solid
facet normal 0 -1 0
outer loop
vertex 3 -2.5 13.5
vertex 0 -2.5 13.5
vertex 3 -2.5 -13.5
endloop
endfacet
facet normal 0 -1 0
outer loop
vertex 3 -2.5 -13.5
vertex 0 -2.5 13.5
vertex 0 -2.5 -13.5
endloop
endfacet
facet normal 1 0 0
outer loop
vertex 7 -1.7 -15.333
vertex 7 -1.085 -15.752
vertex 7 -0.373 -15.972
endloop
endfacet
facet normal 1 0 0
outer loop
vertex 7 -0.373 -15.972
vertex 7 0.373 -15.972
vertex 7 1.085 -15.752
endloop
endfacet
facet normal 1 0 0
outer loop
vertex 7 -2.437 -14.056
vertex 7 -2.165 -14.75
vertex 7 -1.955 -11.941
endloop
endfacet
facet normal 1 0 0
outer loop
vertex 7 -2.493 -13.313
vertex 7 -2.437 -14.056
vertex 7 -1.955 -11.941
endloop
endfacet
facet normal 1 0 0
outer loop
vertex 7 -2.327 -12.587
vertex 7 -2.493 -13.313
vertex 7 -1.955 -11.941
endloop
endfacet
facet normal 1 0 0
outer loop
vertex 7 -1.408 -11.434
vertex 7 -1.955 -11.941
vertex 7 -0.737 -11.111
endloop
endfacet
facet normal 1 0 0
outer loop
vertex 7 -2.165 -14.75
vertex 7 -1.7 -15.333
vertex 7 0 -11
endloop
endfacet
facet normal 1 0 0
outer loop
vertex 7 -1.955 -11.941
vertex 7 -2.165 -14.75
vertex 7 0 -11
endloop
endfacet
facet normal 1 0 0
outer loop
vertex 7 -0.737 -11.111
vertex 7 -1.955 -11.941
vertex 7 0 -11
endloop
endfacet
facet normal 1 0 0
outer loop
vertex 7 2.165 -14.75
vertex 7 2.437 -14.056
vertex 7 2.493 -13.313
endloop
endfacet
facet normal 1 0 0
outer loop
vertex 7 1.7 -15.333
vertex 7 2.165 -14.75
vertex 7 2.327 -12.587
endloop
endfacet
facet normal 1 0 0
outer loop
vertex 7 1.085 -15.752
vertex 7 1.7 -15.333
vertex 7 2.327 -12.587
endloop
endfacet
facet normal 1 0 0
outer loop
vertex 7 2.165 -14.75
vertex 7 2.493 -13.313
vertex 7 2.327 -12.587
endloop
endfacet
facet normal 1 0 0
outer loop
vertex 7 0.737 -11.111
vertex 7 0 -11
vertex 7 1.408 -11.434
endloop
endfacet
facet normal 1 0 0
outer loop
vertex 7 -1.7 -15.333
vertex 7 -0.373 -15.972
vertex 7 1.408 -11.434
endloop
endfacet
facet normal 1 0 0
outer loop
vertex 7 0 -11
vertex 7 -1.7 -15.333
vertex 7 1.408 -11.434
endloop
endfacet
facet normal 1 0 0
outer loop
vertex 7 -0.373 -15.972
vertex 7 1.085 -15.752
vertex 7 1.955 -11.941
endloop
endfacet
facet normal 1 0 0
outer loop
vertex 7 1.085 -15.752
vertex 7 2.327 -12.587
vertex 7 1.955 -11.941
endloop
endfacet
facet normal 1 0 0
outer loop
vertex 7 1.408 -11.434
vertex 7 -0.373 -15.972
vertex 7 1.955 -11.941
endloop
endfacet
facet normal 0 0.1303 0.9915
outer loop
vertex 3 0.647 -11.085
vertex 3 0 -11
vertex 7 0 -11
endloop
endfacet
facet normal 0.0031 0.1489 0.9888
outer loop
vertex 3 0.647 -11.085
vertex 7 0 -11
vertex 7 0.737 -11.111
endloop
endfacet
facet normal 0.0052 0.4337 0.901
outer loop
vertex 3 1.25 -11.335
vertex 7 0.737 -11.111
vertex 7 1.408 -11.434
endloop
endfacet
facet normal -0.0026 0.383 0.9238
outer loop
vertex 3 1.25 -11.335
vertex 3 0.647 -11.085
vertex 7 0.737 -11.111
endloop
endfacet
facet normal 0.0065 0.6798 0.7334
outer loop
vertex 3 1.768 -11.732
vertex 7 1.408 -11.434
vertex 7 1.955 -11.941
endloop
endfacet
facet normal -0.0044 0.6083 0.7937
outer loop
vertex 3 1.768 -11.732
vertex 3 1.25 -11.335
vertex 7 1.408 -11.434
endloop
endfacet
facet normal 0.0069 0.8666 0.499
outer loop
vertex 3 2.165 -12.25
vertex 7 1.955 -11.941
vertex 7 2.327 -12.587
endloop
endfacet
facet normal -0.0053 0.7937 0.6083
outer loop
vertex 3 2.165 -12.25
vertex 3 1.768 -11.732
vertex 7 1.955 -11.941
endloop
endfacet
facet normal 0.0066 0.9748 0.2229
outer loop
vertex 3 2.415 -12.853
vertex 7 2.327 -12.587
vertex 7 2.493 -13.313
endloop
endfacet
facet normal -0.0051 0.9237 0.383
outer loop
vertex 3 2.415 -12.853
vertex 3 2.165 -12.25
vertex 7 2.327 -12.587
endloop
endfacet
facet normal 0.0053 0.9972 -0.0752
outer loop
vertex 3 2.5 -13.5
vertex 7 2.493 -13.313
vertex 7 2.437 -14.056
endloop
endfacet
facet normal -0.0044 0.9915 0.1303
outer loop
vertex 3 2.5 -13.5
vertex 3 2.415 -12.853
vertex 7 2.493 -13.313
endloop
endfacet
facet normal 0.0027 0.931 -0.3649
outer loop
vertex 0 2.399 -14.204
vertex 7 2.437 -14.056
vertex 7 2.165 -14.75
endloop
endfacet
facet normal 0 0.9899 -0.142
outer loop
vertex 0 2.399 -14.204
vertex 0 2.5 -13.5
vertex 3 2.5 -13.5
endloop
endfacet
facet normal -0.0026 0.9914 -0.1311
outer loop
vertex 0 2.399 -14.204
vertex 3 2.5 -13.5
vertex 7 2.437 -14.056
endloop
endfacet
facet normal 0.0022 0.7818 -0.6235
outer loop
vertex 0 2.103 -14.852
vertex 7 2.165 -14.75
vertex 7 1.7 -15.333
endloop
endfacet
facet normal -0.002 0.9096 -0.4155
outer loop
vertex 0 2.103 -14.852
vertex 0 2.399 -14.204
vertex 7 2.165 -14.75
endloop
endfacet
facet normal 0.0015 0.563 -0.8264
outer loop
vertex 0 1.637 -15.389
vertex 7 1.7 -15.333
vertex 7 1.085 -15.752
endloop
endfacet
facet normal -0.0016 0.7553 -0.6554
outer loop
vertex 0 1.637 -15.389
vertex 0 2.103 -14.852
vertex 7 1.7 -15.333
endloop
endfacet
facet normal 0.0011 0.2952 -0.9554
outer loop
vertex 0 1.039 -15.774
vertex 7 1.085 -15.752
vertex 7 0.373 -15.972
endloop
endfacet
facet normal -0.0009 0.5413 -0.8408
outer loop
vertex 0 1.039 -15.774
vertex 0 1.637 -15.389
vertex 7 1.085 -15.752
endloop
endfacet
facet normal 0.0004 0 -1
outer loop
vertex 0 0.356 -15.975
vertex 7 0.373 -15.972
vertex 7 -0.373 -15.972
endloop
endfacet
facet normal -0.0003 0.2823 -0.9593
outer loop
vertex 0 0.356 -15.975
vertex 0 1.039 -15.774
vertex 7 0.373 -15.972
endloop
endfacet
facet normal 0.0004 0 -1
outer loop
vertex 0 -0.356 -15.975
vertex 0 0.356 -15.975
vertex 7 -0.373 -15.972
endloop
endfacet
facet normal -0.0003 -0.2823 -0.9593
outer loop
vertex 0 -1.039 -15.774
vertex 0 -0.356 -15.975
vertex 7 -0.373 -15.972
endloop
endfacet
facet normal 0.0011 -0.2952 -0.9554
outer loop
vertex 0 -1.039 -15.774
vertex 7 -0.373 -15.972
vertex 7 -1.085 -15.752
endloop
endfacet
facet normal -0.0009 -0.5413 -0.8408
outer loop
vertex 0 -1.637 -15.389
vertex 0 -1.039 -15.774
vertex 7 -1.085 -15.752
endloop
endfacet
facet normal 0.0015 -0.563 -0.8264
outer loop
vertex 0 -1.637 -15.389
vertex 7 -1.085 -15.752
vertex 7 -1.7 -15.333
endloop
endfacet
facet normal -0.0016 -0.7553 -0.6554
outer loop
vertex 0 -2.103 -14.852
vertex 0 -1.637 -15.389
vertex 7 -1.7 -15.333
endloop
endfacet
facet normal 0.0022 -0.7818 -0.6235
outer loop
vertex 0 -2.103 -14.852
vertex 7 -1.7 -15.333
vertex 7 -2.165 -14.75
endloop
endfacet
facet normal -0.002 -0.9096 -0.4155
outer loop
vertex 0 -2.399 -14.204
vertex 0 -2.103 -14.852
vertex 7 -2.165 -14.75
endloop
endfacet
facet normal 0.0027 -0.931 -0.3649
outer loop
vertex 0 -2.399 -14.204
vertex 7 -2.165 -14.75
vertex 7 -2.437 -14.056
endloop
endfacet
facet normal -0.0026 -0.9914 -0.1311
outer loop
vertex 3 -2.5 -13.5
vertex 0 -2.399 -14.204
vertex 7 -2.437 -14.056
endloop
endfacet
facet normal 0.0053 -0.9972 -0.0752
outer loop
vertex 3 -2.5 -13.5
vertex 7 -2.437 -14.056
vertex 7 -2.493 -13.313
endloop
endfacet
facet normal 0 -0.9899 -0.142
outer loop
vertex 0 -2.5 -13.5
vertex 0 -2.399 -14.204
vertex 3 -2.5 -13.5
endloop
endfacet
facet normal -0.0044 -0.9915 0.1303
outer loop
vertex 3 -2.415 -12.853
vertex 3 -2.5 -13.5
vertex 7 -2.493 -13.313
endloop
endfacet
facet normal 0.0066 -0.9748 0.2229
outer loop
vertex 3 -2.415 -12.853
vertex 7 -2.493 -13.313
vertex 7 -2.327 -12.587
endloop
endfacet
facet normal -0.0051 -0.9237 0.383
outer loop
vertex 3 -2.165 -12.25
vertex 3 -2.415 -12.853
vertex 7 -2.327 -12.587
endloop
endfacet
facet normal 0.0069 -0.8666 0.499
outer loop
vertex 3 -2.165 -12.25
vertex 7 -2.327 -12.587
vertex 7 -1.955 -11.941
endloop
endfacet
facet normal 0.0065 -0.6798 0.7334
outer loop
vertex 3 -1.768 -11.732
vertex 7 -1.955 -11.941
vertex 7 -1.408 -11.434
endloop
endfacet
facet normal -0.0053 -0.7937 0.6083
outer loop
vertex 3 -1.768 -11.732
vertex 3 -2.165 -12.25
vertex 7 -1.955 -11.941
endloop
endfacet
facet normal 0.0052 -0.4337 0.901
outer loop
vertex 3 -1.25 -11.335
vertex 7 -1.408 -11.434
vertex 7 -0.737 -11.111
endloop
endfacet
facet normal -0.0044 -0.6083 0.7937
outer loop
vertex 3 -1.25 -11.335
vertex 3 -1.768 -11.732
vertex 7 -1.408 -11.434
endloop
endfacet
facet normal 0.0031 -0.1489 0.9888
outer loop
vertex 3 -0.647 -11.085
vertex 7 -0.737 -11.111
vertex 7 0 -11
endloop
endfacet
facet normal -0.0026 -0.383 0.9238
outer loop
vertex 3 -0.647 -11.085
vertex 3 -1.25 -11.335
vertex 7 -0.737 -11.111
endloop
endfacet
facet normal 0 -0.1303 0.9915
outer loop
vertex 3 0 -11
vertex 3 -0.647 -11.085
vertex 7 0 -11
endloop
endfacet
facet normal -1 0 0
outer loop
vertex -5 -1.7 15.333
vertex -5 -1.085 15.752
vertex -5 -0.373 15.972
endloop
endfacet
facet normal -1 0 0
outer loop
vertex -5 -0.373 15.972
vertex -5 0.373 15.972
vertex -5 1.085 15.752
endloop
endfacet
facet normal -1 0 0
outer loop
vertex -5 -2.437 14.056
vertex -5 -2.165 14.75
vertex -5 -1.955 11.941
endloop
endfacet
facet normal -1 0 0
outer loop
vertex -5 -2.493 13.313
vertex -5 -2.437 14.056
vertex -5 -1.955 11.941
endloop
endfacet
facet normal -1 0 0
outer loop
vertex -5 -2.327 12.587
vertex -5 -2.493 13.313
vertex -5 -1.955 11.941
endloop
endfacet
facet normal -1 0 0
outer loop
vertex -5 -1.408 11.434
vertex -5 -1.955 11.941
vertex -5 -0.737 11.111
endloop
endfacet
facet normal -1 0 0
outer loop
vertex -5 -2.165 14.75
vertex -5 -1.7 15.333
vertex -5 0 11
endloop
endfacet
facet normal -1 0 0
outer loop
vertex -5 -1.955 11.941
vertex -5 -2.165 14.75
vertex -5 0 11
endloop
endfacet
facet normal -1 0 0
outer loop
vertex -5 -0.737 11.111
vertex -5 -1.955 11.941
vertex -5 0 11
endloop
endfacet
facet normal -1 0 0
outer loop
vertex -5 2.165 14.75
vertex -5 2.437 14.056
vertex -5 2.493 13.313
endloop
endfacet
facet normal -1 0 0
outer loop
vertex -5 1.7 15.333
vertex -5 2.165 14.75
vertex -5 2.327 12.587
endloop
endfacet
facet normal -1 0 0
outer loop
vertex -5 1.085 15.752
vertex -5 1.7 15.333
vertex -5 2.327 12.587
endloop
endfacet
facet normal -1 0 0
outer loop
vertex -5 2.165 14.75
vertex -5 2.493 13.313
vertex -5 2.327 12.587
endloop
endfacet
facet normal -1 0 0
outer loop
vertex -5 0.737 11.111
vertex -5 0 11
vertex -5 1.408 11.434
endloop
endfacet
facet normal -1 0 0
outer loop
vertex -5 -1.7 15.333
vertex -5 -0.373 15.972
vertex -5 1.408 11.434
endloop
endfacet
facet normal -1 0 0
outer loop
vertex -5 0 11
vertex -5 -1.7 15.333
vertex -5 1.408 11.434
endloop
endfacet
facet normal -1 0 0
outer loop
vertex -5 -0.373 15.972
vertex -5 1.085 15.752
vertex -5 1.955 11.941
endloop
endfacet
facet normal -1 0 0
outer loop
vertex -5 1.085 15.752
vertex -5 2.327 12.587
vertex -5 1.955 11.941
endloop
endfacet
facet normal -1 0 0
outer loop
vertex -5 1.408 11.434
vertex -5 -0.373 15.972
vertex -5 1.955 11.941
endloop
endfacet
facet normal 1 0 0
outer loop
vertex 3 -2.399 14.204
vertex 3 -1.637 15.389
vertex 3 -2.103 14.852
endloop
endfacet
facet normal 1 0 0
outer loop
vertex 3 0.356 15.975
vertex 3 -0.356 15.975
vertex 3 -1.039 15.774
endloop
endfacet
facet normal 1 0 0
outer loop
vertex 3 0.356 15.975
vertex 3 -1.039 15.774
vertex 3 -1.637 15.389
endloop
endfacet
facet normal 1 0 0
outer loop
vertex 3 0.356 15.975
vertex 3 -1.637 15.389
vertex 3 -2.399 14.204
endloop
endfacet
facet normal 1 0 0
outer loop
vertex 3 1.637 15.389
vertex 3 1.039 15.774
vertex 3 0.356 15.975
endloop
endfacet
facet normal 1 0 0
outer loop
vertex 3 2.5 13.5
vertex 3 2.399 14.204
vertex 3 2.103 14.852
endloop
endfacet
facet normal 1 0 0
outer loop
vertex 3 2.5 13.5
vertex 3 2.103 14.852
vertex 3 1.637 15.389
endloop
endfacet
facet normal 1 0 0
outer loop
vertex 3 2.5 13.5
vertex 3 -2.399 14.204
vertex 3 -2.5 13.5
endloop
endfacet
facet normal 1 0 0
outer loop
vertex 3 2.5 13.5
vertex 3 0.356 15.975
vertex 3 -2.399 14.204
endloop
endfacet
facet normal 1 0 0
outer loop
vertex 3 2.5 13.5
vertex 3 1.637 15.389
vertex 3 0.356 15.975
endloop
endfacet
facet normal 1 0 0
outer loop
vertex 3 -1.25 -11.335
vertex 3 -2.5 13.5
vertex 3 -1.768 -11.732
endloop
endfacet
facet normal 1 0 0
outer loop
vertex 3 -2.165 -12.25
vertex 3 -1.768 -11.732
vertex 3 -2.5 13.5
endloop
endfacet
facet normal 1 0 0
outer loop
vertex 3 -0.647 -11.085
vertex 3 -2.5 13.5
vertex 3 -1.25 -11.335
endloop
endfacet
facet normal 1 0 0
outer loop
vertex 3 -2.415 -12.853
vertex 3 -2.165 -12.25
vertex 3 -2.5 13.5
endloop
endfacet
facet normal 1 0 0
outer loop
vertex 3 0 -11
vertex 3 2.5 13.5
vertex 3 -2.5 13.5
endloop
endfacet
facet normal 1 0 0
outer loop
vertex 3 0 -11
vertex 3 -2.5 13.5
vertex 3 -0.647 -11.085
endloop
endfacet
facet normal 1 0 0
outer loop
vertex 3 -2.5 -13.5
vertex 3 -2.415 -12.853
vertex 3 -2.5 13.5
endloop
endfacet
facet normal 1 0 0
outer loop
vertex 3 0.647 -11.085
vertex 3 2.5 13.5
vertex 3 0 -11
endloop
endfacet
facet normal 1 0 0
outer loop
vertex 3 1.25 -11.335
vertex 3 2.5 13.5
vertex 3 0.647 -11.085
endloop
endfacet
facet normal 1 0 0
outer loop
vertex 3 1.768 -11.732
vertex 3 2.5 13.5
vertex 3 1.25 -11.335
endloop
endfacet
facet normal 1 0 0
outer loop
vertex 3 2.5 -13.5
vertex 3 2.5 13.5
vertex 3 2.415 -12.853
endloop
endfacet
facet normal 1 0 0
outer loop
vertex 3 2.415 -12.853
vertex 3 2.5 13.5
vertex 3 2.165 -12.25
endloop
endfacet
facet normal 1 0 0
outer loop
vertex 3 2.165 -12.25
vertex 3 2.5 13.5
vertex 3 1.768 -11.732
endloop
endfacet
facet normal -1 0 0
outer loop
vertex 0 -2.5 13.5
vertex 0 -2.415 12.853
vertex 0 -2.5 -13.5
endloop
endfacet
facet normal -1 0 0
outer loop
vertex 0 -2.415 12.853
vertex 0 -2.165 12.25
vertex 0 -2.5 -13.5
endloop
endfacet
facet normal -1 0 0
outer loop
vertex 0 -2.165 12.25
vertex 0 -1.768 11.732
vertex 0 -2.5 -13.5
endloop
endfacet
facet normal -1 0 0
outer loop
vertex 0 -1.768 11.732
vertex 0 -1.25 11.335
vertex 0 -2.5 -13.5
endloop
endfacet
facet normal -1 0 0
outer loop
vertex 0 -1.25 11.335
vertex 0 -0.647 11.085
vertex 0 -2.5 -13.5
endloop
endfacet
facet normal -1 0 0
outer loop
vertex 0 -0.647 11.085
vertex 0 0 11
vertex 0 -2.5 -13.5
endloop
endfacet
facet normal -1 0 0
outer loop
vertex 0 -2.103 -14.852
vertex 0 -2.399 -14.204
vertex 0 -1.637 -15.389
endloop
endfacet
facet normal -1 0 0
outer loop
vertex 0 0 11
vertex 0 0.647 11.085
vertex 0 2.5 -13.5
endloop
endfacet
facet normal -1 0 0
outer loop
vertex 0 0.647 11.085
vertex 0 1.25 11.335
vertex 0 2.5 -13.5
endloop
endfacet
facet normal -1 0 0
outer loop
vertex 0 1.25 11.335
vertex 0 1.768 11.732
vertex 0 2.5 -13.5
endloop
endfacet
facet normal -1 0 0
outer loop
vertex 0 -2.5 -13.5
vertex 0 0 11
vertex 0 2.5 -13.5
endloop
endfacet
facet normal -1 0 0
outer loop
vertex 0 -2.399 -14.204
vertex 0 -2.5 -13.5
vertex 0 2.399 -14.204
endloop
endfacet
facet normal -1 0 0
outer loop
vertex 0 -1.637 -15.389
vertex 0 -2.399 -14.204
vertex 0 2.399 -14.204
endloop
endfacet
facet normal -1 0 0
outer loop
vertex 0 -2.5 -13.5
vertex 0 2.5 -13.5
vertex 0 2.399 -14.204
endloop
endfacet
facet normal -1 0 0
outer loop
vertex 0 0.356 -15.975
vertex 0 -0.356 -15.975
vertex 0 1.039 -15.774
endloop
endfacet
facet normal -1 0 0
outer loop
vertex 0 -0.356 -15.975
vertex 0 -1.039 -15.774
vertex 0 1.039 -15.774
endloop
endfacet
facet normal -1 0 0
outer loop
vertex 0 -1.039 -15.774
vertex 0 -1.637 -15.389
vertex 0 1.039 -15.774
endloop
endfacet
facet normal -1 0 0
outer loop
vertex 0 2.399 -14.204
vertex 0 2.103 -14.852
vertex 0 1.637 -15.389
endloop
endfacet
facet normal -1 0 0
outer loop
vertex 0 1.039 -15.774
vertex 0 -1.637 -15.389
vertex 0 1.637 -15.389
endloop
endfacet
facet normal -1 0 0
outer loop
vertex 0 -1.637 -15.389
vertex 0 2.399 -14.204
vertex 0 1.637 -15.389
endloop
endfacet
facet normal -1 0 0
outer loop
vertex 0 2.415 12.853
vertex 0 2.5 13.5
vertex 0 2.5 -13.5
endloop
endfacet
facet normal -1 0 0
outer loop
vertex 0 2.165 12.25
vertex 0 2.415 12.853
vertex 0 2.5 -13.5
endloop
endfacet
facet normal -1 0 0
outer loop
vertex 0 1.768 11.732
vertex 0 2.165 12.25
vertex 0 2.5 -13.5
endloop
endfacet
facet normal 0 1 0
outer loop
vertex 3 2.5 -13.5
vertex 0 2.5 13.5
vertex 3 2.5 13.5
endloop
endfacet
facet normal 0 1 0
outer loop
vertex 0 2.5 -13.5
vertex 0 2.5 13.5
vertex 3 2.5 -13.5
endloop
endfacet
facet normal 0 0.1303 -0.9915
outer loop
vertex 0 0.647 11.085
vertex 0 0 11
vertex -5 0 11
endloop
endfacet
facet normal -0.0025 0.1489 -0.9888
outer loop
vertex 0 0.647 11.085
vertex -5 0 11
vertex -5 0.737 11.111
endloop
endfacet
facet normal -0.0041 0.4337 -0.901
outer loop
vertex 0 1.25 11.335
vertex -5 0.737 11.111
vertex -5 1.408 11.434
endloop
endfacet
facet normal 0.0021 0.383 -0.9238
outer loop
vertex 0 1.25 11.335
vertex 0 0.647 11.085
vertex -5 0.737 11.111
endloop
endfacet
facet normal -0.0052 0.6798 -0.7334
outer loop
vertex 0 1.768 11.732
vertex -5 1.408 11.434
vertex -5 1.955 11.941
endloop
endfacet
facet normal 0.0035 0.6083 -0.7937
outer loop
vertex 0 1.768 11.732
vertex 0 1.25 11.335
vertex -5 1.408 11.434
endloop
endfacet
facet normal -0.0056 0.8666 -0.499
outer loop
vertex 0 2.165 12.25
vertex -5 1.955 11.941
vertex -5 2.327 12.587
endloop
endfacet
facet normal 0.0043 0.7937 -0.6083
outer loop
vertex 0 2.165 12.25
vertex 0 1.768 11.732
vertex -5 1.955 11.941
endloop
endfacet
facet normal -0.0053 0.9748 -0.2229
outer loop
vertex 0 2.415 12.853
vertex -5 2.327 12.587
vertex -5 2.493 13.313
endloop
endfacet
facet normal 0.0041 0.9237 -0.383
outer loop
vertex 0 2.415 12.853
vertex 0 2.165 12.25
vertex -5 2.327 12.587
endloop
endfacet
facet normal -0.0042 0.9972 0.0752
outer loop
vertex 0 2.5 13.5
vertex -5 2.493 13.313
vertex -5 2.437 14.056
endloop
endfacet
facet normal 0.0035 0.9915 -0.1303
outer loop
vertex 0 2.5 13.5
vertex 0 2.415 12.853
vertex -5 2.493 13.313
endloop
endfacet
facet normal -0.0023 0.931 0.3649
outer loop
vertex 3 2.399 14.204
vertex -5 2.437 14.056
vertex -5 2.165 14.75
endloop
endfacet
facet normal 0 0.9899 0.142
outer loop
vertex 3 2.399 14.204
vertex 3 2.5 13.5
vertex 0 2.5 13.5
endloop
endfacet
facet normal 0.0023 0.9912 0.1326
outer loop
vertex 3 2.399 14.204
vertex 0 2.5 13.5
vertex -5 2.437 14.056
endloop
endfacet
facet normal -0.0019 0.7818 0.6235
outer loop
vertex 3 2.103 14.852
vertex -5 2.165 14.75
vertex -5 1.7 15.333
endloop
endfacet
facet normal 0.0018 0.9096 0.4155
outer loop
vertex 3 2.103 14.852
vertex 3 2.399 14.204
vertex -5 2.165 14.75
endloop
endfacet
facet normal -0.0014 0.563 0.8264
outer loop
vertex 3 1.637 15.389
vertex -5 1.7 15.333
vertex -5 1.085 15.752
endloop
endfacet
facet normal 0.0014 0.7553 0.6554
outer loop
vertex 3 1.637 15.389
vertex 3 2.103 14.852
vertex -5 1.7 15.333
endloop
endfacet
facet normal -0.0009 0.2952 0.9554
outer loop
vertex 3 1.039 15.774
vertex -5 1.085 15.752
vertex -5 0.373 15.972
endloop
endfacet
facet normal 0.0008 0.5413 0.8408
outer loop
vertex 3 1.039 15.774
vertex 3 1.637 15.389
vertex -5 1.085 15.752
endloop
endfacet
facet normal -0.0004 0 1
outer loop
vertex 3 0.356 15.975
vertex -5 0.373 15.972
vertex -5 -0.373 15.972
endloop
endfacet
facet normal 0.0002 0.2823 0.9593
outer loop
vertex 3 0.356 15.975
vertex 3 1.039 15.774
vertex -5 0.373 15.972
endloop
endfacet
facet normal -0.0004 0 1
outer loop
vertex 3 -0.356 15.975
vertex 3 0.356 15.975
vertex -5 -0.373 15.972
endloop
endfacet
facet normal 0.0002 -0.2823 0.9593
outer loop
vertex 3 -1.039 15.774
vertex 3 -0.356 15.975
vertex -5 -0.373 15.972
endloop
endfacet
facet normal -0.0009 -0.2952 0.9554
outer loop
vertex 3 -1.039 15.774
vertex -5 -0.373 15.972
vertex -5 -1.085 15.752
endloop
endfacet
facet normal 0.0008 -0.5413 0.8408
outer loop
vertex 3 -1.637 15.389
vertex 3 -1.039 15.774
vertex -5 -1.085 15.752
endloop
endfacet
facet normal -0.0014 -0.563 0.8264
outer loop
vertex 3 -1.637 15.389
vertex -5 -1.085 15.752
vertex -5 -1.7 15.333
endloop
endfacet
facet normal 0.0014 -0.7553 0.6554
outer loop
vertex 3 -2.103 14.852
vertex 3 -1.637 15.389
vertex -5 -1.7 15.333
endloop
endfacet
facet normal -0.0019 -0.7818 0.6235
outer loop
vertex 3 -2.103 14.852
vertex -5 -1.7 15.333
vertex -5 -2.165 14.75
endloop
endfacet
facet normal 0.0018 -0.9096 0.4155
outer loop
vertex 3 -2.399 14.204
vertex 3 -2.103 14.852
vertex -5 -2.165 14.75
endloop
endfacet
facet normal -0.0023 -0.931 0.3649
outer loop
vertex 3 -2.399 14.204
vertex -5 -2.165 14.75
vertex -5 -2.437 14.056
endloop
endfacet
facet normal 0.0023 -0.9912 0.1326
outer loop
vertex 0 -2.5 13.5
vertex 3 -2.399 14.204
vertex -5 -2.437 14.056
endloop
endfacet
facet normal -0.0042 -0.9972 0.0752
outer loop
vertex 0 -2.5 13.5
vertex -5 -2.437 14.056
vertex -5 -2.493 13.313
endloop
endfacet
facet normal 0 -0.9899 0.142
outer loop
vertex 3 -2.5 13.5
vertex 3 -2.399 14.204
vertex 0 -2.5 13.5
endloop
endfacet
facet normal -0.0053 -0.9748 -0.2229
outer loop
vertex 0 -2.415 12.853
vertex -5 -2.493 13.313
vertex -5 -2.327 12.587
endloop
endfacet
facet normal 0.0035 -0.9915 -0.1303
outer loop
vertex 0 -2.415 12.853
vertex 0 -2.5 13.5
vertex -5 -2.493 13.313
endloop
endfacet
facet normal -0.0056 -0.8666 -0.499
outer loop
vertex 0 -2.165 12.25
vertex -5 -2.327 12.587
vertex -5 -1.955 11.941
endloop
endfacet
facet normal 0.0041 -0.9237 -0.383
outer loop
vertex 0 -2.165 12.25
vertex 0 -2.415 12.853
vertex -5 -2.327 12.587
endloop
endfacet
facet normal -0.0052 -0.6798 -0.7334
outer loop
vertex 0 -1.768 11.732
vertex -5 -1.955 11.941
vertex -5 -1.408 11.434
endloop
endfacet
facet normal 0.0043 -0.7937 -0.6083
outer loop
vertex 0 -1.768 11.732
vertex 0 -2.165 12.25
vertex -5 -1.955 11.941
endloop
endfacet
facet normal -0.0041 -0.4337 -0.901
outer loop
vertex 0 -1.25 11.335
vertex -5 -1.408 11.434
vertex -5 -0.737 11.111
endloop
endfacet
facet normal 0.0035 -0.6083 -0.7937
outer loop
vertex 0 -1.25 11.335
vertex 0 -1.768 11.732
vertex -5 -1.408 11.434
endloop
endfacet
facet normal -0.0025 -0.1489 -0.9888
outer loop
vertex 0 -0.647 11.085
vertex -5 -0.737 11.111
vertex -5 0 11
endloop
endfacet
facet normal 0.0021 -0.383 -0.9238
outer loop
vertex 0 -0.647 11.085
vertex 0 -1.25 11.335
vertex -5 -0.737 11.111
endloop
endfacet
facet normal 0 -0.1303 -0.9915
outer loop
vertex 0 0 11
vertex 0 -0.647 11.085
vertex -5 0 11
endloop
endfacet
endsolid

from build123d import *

# Parameters (mm, degrees)
SKETCH1_W           = 27
SKETCH1_H           = 5
BOSS_EXTRUDE1_DEPTH = 3
SKETCH2_R           = 2.5
BOSS_EXTRUDE2_DEPTH = 8
SKETCH3_R           = 2.5
BOSS_EXTRUDE3_DEPTH = 7


with BuildPart() as part:
    # Sketch1 → Boss-Extrude1 (new body)
    with BuildSketch(Plane(origin=(0, 0, 0), x_dir=(0, 0, -1), z_dir=(1, 0, 0))):
        Rectangle(SKETCH1_W, SKETCH1_H)
    extrude(amount=BOSS_EXTRUDE1_DEPTH)

    # Sketch2 → Boss-Extrude2 (add)
    with BuildSketch(Plane(origin=(3, 0, 0), x_dir=(0, 0, -1), z_dir=(1, 0, 0))):
        with Locations((-13.5, 0)):
            Circle(SKETCH2_R)
    extrude(amount=-BOSS_EXTRUDE2_DEPTH)

    # Sketch3 → Boss-Extrude3 (add)
    with BuildSketch(Plane.ZY):
        with Locations((-13.5, 0)):
            Circle(SKETCH3_R)
    extrude(amount=-BOSS_EXTRUDE3_DEPTH)


solid = part.part
